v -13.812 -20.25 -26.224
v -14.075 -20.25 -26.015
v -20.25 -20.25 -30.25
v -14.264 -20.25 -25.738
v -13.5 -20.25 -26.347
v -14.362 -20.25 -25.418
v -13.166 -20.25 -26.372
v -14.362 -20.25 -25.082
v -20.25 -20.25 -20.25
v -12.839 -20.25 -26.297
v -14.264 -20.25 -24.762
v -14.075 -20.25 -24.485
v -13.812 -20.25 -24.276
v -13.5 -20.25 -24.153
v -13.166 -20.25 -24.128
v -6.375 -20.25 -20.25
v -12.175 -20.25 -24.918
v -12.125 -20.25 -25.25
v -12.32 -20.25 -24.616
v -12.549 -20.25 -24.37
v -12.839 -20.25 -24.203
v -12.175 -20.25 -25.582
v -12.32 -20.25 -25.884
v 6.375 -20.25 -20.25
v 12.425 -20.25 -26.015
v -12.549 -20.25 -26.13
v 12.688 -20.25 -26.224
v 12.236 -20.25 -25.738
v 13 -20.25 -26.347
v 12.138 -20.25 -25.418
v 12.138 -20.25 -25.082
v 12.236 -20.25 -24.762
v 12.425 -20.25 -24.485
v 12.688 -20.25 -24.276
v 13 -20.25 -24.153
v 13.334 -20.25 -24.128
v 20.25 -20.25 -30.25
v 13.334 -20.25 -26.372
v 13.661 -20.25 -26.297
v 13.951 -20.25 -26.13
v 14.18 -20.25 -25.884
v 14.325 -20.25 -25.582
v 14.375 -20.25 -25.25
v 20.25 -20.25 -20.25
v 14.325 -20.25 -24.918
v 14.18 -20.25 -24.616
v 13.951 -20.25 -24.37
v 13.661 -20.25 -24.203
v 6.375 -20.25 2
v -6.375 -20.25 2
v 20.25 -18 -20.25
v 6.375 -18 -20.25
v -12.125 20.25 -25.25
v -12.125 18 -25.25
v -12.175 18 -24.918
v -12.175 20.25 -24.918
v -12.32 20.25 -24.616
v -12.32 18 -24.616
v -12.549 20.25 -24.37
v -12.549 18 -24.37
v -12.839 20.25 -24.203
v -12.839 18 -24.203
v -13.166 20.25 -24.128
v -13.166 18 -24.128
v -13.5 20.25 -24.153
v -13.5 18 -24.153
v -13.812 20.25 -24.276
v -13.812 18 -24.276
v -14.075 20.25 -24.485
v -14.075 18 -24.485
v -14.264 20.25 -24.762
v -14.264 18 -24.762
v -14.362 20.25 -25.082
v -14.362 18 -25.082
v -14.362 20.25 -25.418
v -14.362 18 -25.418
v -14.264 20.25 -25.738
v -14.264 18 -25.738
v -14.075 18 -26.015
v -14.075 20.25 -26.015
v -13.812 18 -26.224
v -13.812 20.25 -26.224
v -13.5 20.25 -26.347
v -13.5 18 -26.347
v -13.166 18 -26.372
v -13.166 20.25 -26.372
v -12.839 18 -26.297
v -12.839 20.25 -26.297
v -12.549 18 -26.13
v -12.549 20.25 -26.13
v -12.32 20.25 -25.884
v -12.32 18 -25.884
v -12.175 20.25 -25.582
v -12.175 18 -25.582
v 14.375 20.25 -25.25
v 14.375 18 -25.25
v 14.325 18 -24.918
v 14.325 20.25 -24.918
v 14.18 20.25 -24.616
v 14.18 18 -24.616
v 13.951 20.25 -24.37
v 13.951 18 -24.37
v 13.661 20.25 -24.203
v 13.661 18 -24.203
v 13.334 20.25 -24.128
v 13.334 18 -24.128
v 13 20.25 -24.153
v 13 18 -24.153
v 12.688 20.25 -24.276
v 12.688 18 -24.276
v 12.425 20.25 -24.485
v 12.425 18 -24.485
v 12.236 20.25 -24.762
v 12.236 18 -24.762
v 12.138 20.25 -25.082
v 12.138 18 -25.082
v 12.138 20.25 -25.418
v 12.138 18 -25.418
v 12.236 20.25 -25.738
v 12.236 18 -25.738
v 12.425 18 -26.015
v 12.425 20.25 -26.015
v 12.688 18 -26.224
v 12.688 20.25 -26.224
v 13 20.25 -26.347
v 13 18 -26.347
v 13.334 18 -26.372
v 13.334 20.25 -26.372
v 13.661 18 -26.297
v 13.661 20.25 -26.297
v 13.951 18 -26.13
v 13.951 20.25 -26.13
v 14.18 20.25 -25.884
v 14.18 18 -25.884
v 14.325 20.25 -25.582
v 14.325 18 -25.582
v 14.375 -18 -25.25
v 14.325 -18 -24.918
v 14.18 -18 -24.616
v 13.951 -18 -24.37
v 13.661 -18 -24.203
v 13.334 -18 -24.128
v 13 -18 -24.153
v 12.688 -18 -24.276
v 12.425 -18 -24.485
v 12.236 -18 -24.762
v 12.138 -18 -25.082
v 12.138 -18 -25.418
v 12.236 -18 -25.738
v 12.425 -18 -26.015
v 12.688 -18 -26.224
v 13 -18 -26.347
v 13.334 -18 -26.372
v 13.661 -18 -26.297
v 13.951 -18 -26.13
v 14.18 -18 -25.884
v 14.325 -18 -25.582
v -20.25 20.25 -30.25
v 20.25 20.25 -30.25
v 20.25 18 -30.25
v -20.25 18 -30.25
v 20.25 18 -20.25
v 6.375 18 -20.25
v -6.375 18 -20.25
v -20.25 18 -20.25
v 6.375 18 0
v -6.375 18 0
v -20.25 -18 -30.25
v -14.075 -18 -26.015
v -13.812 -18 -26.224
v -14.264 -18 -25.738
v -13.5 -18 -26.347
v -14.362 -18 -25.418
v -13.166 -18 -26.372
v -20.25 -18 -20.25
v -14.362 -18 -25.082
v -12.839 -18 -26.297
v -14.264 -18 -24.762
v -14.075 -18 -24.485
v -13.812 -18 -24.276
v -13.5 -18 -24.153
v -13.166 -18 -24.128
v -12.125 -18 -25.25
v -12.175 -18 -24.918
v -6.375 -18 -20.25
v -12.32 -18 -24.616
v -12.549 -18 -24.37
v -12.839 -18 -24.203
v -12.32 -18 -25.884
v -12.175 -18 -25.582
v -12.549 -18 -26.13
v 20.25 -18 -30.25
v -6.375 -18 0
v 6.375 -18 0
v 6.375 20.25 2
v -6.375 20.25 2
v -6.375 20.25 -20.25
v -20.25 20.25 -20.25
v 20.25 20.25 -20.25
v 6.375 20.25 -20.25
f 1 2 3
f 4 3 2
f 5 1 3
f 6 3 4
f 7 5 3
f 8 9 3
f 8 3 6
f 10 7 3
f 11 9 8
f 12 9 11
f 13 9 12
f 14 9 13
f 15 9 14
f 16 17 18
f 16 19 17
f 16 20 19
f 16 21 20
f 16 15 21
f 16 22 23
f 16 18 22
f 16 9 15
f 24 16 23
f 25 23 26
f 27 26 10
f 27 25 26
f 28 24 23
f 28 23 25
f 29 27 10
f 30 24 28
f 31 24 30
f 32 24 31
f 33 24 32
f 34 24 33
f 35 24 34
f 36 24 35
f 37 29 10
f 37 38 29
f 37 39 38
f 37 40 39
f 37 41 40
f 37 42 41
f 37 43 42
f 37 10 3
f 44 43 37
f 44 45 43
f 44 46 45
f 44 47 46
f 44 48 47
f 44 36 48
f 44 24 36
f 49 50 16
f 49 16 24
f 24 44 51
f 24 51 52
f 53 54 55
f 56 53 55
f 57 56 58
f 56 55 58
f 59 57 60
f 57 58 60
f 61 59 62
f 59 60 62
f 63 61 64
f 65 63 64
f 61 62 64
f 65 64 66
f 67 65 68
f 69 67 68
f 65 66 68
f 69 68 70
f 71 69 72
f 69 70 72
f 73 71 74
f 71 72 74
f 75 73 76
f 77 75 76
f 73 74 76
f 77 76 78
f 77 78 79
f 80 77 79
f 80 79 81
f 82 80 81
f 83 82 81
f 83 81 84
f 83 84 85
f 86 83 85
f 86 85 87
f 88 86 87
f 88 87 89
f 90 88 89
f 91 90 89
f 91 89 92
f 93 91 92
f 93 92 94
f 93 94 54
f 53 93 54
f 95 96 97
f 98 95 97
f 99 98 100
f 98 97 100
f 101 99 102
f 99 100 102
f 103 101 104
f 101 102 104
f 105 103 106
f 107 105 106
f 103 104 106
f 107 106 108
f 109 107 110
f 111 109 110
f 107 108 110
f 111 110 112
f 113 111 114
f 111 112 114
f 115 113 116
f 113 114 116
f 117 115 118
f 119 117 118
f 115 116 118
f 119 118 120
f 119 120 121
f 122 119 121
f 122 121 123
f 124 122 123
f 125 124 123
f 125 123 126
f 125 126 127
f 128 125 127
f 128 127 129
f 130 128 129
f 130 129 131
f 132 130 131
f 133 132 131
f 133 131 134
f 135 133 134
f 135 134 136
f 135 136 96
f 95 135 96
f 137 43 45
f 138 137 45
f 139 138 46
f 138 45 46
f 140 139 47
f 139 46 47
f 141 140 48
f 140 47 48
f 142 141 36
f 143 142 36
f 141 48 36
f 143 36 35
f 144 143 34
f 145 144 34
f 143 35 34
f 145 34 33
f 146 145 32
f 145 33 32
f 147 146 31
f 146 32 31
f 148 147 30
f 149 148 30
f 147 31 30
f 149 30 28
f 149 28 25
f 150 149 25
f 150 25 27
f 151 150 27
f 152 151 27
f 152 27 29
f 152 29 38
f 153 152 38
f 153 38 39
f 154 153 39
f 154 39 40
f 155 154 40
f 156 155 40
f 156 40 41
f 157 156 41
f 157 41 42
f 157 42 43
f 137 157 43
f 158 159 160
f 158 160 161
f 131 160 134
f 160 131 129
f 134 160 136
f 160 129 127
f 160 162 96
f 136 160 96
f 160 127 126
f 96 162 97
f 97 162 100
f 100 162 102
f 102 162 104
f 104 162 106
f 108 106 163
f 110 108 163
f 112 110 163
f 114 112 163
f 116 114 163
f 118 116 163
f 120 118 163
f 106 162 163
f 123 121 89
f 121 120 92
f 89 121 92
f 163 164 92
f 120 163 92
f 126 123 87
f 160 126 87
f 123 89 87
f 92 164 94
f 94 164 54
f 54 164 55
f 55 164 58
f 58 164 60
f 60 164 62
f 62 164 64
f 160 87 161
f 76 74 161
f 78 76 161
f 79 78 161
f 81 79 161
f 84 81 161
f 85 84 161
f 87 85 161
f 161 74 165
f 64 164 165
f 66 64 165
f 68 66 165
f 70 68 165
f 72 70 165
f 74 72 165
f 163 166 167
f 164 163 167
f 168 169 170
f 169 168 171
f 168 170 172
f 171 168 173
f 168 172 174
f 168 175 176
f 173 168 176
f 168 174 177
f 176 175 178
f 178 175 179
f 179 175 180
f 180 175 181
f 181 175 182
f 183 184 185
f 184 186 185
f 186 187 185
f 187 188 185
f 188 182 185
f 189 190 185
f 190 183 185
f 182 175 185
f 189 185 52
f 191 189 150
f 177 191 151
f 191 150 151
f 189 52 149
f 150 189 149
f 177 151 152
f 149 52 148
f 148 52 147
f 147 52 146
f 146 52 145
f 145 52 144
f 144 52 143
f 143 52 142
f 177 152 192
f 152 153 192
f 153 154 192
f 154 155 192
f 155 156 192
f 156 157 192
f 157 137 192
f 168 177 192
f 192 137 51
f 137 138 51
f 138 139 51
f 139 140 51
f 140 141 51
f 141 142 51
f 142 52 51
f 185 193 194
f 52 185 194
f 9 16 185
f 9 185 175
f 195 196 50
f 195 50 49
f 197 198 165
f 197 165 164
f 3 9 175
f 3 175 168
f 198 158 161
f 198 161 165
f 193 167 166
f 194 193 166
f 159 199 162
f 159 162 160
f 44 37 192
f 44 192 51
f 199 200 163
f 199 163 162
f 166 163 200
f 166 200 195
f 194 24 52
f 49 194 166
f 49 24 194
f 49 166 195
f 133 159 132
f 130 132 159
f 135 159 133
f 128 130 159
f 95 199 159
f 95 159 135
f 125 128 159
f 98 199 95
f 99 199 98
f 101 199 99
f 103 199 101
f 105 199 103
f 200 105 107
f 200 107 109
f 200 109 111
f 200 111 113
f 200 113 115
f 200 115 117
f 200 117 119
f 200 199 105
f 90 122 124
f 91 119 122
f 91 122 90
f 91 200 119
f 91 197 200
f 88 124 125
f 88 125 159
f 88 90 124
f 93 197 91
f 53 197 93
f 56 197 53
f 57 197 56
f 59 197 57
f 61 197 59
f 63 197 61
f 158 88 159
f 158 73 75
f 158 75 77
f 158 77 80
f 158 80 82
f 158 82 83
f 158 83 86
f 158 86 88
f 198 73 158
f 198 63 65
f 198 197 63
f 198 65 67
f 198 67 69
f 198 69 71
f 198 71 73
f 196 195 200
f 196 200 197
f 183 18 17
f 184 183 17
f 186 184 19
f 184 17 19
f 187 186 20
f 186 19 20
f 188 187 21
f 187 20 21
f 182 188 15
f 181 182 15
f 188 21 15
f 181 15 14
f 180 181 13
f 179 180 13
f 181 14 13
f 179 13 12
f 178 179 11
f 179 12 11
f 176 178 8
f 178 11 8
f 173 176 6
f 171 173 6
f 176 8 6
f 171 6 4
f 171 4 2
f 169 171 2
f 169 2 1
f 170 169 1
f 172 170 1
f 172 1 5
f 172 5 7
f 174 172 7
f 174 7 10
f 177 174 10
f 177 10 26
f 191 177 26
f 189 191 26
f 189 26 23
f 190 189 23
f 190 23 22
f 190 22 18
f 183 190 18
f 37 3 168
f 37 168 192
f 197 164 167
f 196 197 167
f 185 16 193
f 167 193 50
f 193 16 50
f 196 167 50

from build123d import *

# Parameters (mm, degrees)
F0_W      = 12.75
F0_H      = 40.5
F2_DEPTH  = 2
F3_START  = 18
F1_W      = 12.75
F1_H      = 20.25
F3_DEPTH  = 2.25
F4_START  = -18
F4_DEPTH  = 2.25
F6_DEPTH  = 2.25
F8_DEPTH  = 2.25
F9_R      = 1.125
F10_DEPTH = 40.501


with BuildPart() as f2:
    # F0 (on Top) → F2 (new body)
    with BuildSketch(Plane.XY):
        Rectangle(F0_W, F0_H)
    extrude(amount=F2_DEPTH)

    # F1 (on Front) → F3 (join)
    with BuildSketch(Plane.XZ.offset(F3_START)):
        with Locations((0, -10.125)):
            Rectangle(F1_W, F1_H)
    extrude(amount=F3_DEPTH)

    # F1 (on Front) → F4 (join)
    with BuildSketch(Plane.XZ.offset(F4_START)):
        with Locations((0, -10.125)):
            Rectangle(F1_W, F1_H)
    extrude(amount=-F4_DEPTH)

    # F5 (on face) → F6 (join, through all)
    with BuildSketch(Plane(origin=(0, 20.25, 0), x_dir=(-1, 0, 0), z_dir=(0, 1, 0))):
        Polygon((-6.375, -20.25), (-20.25, -20.25), (-20.25, -30.25), (20.25, -30.25), (20.25, -20.25), (6.375, -20.25), align=None)
    extrude(amount=-F6_DEPTH)

    # F7 (on face) → F8 (join, through all)
    with BuildSketch(Plane.XZ.offset(20.25)):
        Polygon((0, -20.25), (-20.25, -20.25), (-20.25, -30.25), (20.25, -30.25), (20.25, -20.25), align=None)
    extrude(amount=-F8_DEPTH)

    # F9 (on face) → F10 (cut, through all)
    with BuildSketch(Plane.XZ.offset(20.25)):
        with Locations((-13.25, -25.25)):
            Circle(F9_R)
        with Locations((13.25, -25.25)):
            Circle(F9_R)
    extrude(amount=-F10_DEPTH, mode=Mode.SUBTRACT)


solid = f2.part
